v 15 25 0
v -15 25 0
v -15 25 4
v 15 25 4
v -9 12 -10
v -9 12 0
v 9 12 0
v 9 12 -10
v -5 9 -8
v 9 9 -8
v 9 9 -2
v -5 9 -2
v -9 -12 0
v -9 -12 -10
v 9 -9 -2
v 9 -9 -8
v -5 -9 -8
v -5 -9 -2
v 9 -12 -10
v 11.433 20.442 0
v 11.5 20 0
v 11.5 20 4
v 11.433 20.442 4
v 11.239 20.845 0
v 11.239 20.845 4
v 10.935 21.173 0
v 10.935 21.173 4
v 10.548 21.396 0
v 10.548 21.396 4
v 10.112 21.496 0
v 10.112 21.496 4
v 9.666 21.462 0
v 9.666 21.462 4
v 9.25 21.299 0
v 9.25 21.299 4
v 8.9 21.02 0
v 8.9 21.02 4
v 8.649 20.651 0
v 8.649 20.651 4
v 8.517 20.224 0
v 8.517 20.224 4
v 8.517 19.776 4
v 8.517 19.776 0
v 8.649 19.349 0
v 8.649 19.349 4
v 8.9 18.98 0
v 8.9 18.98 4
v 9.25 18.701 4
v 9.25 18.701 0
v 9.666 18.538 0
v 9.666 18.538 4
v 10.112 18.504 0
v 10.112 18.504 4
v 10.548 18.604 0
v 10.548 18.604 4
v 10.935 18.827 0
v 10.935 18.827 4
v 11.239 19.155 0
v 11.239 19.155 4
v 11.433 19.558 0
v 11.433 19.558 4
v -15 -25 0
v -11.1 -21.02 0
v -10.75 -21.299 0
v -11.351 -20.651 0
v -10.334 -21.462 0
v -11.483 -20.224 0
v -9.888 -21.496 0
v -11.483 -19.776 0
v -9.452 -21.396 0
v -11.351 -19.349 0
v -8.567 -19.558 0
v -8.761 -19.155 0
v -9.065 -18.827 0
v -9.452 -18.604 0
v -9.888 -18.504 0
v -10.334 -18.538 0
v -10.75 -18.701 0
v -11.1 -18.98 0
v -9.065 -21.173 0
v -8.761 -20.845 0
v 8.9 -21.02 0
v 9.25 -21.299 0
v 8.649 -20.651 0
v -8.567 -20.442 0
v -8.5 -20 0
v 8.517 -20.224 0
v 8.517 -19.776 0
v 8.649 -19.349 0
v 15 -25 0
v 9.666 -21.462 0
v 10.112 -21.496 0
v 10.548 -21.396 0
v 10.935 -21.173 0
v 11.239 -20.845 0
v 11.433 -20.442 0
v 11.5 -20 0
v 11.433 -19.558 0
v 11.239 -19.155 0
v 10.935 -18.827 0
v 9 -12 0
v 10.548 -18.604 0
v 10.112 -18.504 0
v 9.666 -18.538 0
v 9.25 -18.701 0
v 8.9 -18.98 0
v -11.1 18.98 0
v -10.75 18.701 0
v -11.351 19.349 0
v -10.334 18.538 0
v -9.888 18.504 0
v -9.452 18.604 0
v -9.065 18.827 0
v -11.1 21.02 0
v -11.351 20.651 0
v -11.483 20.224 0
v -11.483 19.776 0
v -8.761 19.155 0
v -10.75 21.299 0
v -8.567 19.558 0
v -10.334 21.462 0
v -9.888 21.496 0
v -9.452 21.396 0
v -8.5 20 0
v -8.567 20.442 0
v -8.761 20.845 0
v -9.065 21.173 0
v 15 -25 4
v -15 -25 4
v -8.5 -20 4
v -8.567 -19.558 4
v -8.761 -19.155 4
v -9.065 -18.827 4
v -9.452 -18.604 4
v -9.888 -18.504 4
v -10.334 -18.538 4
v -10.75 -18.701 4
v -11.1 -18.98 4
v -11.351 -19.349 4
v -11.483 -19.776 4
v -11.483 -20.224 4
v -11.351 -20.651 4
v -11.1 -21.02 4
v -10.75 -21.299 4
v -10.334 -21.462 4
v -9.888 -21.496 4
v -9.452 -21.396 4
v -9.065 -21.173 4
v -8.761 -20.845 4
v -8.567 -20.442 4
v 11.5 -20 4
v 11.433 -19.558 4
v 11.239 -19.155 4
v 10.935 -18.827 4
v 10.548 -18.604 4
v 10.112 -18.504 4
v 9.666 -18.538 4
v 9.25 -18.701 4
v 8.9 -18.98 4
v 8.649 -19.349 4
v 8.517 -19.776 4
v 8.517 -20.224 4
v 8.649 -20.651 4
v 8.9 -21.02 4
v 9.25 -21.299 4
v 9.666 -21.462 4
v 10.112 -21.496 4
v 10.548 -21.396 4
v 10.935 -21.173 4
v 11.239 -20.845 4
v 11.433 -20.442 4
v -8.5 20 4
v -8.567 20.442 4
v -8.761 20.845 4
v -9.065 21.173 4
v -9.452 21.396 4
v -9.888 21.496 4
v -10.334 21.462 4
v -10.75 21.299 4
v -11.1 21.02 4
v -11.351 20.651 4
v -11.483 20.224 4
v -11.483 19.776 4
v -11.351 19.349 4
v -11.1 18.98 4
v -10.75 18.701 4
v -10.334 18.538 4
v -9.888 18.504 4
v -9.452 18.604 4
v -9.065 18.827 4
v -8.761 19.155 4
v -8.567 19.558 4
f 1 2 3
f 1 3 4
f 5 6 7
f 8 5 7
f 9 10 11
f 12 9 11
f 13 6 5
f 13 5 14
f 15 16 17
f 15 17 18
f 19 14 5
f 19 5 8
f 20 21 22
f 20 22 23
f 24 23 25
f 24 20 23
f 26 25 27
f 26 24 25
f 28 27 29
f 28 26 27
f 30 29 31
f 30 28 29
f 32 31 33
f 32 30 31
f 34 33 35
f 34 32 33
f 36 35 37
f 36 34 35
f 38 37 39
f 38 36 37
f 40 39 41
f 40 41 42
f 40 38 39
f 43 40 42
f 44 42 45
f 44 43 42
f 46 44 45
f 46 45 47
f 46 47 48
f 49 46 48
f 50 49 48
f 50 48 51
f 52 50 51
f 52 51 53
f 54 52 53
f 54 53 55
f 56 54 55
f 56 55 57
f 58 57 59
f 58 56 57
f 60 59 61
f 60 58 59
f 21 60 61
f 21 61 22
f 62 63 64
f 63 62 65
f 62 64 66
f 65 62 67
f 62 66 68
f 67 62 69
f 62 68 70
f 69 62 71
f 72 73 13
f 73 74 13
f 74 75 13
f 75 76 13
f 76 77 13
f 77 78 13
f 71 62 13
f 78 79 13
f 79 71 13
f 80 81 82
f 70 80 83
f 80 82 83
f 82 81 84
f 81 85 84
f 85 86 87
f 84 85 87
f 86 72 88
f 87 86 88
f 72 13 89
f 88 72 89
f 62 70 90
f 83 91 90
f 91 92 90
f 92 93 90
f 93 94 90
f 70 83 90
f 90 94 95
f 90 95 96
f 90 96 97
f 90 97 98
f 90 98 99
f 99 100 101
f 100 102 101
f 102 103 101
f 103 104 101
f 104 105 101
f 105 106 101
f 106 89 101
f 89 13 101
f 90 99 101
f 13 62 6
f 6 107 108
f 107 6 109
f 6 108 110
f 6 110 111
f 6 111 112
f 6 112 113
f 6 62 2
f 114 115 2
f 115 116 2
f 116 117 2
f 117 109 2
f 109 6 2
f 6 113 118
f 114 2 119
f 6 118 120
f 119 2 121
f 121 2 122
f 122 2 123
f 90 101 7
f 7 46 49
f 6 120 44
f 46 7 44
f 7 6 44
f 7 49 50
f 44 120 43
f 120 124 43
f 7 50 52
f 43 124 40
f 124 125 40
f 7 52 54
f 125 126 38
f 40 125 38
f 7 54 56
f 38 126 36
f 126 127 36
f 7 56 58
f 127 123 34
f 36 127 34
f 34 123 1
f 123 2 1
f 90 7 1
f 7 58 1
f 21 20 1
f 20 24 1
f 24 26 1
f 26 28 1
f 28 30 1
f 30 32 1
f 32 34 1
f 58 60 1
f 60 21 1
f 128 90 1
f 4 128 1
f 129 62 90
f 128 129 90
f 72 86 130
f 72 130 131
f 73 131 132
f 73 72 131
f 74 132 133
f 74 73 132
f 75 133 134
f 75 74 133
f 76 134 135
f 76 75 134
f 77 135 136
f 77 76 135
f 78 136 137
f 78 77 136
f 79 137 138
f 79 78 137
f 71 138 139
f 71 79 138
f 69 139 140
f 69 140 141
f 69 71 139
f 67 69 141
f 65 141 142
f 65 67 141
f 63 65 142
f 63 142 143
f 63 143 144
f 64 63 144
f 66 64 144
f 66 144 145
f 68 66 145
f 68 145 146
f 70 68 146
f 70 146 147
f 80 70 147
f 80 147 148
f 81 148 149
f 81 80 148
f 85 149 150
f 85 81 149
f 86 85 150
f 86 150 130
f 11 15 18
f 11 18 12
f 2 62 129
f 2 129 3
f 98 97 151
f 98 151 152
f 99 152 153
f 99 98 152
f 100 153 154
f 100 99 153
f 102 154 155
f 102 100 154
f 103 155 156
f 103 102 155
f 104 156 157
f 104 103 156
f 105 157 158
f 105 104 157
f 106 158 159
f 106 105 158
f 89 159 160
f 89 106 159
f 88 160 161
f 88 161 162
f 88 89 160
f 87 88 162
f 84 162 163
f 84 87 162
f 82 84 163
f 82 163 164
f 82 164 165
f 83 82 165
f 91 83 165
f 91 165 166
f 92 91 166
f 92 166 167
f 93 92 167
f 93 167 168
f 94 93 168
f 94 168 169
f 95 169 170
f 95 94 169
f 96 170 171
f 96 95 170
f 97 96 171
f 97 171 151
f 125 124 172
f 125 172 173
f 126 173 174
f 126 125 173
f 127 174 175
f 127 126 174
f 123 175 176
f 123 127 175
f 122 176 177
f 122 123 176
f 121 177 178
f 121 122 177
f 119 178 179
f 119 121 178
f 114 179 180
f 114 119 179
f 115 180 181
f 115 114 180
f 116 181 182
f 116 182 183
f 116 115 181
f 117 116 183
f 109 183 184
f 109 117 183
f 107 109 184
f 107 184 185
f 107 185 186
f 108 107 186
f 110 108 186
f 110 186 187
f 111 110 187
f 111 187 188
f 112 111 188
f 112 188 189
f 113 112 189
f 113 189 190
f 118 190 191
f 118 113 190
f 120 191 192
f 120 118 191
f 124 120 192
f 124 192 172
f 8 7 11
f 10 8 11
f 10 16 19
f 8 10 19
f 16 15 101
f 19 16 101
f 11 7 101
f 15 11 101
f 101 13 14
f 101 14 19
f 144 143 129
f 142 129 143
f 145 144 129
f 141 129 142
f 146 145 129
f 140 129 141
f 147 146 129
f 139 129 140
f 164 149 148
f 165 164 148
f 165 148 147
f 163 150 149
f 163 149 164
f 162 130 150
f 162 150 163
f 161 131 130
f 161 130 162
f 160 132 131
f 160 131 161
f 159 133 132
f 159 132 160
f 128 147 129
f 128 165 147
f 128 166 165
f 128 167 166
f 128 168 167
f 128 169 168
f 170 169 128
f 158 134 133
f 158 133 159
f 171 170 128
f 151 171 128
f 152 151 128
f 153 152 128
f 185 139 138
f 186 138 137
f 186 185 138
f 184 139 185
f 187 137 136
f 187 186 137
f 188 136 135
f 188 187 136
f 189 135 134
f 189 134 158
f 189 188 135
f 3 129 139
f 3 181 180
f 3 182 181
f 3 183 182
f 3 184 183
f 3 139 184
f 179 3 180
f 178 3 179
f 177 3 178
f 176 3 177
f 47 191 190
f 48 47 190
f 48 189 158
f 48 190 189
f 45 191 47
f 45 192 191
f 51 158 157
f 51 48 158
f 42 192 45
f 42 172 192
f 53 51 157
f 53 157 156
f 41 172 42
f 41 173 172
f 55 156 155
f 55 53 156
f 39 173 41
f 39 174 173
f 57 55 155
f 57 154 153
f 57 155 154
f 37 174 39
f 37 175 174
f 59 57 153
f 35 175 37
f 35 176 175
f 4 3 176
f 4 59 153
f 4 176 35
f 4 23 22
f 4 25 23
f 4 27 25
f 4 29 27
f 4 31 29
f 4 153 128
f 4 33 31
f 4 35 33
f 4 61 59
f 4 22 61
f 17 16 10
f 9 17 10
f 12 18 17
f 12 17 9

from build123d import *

# Parameters (mm, degrees)
F0_W     = 30
F0_H     = 50
F0_R     = 1.5
F1_DEPTH = 4
F2_W     = 18
F2_H     = 24
F3_DEPTH = 10
F4_W     = 18
F4_H     = 6
F5_DEPTH = 14


with BuildPart() as f1:
    # F0 (on Top) → F1 (new body)
    with BuildSketch(Plane.XY):
        Rectangle(F0_W, F0_H)
        with Locations((-10, -20)):
            Circle(F0_R, mode=Mode.SUBTRACT)
        with Locations((10, -20)):
            Circle(F0_R, mode=Mode.SUBTRACT)
        with Locations((-10, 20)):
            Circle(F0_R, mode=Mode.SUBTRACT)
        with Locations((10, 20)):
            Circle(F0_R, mode=Mode.SUBTRACT)
    extrude(amount=F1_DEPTH)

    # F2 (on face) → F3 (join)
    with BuildSketch(Plane(origin=(0, 0, 0), x_dir=(1, 0, 0), z_dir=(0, 0, -1))):
        Rectangle(F2_W, F2_H)
    extrude(amount=F3_DEPTH)

    # F4 (on face) → F5 (cut)
    with BuildSketch(Plane.YZ.offset(9)):
        with Locations((0, -5)):
            Rectangle(F4_W, F4_H)
    extrude(amount=-F5_DEPTH, mode=Mode.SUBTRACT)


solid = f1.part
